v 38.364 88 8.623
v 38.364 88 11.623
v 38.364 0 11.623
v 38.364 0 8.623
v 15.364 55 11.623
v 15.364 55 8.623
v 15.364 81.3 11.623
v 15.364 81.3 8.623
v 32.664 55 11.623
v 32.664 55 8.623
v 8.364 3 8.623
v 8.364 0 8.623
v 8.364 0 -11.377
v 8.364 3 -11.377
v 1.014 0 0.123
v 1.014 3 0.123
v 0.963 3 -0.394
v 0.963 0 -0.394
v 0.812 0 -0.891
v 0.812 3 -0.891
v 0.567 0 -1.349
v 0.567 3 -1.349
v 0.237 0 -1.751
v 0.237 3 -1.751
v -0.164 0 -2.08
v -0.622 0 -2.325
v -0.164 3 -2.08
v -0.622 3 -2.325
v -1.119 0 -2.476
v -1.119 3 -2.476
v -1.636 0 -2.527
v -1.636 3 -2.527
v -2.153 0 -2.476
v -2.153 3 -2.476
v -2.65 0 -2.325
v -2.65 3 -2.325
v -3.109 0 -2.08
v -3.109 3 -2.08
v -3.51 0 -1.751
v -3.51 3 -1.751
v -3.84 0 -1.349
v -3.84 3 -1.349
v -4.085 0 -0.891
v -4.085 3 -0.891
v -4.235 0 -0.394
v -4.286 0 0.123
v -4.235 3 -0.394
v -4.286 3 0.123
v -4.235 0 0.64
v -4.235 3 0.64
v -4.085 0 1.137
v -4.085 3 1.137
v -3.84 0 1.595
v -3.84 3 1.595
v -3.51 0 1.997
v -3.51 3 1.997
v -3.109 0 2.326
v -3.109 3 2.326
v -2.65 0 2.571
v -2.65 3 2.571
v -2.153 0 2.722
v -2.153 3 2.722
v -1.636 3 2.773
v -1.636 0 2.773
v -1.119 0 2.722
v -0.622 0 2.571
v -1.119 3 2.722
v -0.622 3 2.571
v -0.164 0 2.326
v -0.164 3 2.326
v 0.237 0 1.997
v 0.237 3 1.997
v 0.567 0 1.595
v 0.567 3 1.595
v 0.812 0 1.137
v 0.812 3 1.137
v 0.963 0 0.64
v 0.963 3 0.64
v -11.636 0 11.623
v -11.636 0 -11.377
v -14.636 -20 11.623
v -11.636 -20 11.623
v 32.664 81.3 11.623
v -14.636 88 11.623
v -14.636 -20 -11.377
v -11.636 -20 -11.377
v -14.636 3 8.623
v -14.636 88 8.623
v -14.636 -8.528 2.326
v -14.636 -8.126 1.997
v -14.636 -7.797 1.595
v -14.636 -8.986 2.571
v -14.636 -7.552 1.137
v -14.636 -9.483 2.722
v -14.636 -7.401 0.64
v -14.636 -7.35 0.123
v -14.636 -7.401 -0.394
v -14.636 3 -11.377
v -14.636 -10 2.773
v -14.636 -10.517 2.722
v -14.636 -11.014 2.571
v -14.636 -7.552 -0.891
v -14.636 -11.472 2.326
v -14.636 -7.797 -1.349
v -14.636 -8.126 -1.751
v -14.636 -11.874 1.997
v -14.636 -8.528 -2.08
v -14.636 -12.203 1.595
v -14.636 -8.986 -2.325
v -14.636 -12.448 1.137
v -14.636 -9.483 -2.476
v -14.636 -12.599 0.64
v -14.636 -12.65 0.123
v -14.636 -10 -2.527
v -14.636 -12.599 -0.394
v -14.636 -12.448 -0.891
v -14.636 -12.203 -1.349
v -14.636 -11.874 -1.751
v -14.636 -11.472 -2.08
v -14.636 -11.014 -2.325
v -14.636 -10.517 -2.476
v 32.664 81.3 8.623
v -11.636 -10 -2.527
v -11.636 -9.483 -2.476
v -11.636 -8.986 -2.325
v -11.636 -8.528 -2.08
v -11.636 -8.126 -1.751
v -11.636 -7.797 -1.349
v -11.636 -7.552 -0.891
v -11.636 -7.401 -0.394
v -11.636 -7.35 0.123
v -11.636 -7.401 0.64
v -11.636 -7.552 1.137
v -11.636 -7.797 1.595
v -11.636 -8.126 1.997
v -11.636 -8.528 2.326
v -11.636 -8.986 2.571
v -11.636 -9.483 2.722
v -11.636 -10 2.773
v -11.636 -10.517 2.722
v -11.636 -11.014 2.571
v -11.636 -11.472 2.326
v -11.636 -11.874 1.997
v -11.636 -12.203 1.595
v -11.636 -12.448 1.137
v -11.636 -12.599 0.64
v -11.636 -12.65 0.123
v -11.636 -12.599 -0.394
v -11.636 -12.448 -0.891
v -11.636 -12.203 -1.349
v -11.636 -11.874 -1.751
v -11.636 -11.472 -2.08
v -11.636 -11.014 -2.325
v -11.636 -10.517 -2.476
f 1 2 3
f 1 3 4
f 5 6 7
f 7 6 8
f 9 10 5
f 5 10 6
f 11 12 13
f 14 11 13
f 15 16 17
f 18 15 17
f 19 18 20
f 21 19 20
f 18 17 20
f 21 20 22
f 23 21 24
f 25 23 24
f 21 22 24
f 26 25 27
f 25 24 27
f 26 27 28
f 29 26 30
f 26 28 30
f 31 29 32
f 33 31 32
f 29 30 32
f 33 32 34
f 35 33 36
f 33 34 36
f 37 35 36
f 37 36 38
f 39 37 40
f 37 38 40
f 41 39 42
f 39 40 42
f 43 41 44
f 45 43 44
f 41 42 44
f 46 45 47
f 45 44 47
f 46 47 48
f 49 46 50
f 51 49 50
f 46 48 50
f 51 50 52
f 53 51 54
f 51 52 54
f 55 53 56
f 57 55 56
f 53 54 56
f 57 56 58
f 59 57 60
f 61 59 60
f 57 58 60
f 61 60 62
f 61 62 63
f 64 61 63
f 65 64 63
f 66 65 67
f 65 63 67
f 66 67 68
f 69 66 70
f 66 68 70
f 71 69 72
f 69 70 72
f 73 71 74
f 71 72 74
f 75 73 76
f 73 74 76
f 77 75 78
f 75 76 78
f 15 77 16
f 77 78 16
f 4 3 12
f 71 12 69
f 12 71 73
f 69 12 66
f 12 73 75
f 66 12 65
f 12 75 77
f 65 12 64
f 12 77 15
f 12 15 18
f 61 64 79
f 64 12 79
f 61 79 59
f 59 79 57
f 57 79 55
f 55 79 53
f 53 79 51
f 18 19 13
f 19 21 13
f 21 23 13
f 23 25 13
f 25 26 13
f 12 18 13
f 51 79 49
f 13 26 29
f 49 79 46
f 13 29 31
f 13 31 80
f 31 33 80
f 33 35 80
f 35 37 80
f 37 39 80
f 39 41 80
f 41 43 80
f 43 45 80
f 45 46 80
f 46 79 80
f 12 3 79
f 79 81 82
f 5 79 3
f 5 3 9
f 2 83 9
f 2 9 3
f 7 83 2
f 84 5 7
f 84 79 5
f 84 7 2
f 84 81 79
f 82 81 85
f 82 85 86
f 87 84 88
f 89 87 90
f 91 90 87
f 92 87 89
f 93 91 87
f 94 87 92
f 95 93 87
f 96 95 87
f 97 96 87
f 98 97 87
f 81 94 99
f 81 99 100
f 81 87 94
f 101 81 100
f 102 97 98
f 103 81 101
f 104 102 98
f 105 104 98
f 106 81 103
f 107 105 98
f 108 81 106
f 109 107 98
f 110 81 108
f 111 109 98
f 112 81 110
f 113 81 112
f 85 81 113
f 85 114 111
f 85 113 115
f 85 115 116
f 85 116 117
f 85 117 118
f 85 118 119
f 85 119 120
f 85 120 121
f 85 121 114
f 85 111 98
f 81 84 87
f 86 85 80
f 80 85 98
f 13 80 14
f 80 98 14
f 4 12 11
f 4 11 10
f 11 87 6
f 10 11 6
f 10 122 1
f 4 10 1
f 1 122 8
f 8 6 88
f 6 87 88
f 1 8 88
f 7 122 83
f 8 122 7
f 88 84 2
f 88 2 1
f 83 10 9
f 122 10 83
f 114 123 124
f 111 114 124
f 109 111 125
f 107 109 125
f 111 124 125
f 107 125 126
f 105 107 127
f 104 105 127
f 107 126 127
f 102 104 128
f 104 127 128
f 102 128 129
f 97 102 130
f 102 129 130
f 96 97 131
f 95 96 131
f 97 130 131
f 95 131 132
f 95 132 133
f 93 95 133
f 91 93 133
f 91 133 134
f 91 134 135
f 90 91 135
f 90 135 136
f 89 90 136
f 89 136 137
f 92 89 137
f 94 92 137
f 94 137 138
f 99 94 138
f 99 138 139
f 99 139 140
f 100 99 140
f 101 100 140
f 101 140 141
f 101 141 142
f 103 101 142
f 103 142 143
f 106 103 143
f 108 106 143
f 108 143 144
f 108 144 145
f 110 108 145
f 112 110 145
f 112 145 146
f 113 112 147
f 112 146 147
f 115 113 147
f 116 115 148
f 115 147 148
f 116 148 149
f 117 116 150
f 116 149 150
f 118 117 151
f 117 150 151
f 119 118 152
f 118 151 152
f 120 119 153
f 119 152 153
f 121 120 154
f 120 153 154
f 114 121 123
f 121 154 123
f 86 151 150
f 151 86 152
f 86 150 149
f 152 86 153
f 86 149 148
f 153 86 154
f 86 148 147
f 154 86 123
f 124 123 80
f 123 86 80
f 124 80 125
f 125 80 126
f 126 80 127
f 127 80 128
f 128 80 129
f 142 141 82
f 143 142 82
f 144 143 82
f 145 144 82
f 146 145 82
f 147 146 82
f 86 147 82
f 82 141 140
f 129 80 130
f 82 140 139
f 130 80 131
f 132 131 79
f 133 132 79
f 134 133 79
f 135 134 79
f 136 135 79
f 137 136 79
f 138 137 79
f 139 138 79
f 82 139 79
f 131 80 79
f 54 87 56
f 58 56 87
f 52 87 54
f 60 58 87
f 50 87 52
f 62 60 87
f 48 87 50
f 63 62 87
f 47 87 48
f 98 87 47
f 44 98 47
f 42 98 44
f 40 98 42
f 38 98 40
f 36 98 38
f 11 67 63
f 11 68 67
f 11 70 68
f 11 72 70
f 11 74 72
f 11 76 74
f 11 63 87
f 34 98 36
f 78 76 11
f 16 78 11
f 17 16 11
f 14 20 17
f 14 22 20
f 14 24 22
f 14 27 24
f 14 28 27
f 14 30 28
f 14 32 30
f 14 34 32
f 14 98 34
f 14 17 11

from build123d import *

# Parameters (mm, degrees)
SKETCH_1_W          = 23
SKETCH_1_H          = 23
EXTRUDE_1_DEPTH     = 3
SKETCH_3_R          = 2.65
CUT_EXTRUDE_1_DEPTH = 3
SKETCH_4_W          = 3
SKETCH_4_H          = 23
EXTRUDE_2_DEPTH     = 20
SKETCH_5_R          = 2.65
CUT_EXTRUDE_2_DEPTH = 20
SKETCH_6_W          = 23
SKETCH_6_H          = 3
EXTRUDE_3_DEPTH     = 85
SKETCH_7_W          = 3
SKETCH_7_H          = 88
EXTRUDE_4_DEPTH     = 30
SKETCH_8_W          = 17.3
SKETCH_8_H          = 26.3
CUT_EXTRUDE_3_DEPTH = 20


with BuildPart() as part:
    # 草图1 → 凸台-拉伸1 (new body)
    with BuildSketch(Plane(origin=(0, 0, 0), x_dir=(1, 0, 0), z_dir=(0, 1, 0))):
        with Locations((-3.136363636, -0.122994652)):
            Rectangle(SKETCH_1_W, SKETCH_1_H)
    extrude(amount=EXTRUDE_1_DEPTH)

    # 草图3 → 切除-拉伸1 (cut)
    with BuildSketch(Plane(origin=(0, 3, 0), x_dir=(1, 0, 0), z_dir=(0, 1, 0))):
        with Locations((-1.636363636, -0.122994652)):
            Circle(SKETCH_3_R)
    extrude(amount=-CUT_EXTRUDE_1_DEPTH, mode=Mode.SUBTRACT)

    # 草图4 → 凸台-拉伸2 (add)
    with BuildSketch(Plane.XZ):
        with Locations((-13.136363636, 0.122994652)):
            Rectangle(SKETCH_4_W, SKETCH_4_H)
    extrude(amount=EXTRUDE_2_DEPTH)

    # 草图5 → 切除-拉伸2 (cut)
    with BuildSketch(Plane(origin=(-11.636363636, 0, 0), x_dir=(0, 0, -1), z_dir=(1, 0, 0))):
        with Locations((-0.122994652, -10)):
            Circle(SKETCH_5_R)
    extrude(amount=-CUT_EXTRUDE_2_DEPTH, mode=Mode.SUBTRACT)

    # 草图6 → 凸台-拉伸3 (add)
    with BuildSketch(Plane(origin=(0, 3, 0), x_dir=(1, 0, 0), z_dir=(0, 1, 0))):
        with Locations((-3.136363636, -10.122994652)):
            Rectangle(SKETCH_6_W, SKETCH_6_H)
    extrude(amount=EXTRUDE_3_DEPTH)

    # 草图7 → 凸台-拉伸4 (add)
    with BuildSketch(Plane(origin=(8.363636364, 0, 0), x_dir=(0, 0, -1), z_dir=(1, 0, 0))):
        with Locations((-10.122994652, 44)):
            Rectangle(SKETCH_7_W, SKETCH_7_H)
    extrude(amount=EXTRUDE_4_DEPTH)

    # 草图8 → 切除-拉伸3 (cut)
    with BuildSketch(Plane(origin=(0, 0, 8.622994652), x_dir=(-1, 0, 0), z_dir=(0, 0, -1))):
        with Locations((-24.013636364, 68.15)):
            Rectangle(SKETCH_8_W, SKETCH_8_H)
    extrude(amount=-CUT_EXTRUDE_3_DEPTH, mode=Mode.SUBTRACT)


solid = part.part
